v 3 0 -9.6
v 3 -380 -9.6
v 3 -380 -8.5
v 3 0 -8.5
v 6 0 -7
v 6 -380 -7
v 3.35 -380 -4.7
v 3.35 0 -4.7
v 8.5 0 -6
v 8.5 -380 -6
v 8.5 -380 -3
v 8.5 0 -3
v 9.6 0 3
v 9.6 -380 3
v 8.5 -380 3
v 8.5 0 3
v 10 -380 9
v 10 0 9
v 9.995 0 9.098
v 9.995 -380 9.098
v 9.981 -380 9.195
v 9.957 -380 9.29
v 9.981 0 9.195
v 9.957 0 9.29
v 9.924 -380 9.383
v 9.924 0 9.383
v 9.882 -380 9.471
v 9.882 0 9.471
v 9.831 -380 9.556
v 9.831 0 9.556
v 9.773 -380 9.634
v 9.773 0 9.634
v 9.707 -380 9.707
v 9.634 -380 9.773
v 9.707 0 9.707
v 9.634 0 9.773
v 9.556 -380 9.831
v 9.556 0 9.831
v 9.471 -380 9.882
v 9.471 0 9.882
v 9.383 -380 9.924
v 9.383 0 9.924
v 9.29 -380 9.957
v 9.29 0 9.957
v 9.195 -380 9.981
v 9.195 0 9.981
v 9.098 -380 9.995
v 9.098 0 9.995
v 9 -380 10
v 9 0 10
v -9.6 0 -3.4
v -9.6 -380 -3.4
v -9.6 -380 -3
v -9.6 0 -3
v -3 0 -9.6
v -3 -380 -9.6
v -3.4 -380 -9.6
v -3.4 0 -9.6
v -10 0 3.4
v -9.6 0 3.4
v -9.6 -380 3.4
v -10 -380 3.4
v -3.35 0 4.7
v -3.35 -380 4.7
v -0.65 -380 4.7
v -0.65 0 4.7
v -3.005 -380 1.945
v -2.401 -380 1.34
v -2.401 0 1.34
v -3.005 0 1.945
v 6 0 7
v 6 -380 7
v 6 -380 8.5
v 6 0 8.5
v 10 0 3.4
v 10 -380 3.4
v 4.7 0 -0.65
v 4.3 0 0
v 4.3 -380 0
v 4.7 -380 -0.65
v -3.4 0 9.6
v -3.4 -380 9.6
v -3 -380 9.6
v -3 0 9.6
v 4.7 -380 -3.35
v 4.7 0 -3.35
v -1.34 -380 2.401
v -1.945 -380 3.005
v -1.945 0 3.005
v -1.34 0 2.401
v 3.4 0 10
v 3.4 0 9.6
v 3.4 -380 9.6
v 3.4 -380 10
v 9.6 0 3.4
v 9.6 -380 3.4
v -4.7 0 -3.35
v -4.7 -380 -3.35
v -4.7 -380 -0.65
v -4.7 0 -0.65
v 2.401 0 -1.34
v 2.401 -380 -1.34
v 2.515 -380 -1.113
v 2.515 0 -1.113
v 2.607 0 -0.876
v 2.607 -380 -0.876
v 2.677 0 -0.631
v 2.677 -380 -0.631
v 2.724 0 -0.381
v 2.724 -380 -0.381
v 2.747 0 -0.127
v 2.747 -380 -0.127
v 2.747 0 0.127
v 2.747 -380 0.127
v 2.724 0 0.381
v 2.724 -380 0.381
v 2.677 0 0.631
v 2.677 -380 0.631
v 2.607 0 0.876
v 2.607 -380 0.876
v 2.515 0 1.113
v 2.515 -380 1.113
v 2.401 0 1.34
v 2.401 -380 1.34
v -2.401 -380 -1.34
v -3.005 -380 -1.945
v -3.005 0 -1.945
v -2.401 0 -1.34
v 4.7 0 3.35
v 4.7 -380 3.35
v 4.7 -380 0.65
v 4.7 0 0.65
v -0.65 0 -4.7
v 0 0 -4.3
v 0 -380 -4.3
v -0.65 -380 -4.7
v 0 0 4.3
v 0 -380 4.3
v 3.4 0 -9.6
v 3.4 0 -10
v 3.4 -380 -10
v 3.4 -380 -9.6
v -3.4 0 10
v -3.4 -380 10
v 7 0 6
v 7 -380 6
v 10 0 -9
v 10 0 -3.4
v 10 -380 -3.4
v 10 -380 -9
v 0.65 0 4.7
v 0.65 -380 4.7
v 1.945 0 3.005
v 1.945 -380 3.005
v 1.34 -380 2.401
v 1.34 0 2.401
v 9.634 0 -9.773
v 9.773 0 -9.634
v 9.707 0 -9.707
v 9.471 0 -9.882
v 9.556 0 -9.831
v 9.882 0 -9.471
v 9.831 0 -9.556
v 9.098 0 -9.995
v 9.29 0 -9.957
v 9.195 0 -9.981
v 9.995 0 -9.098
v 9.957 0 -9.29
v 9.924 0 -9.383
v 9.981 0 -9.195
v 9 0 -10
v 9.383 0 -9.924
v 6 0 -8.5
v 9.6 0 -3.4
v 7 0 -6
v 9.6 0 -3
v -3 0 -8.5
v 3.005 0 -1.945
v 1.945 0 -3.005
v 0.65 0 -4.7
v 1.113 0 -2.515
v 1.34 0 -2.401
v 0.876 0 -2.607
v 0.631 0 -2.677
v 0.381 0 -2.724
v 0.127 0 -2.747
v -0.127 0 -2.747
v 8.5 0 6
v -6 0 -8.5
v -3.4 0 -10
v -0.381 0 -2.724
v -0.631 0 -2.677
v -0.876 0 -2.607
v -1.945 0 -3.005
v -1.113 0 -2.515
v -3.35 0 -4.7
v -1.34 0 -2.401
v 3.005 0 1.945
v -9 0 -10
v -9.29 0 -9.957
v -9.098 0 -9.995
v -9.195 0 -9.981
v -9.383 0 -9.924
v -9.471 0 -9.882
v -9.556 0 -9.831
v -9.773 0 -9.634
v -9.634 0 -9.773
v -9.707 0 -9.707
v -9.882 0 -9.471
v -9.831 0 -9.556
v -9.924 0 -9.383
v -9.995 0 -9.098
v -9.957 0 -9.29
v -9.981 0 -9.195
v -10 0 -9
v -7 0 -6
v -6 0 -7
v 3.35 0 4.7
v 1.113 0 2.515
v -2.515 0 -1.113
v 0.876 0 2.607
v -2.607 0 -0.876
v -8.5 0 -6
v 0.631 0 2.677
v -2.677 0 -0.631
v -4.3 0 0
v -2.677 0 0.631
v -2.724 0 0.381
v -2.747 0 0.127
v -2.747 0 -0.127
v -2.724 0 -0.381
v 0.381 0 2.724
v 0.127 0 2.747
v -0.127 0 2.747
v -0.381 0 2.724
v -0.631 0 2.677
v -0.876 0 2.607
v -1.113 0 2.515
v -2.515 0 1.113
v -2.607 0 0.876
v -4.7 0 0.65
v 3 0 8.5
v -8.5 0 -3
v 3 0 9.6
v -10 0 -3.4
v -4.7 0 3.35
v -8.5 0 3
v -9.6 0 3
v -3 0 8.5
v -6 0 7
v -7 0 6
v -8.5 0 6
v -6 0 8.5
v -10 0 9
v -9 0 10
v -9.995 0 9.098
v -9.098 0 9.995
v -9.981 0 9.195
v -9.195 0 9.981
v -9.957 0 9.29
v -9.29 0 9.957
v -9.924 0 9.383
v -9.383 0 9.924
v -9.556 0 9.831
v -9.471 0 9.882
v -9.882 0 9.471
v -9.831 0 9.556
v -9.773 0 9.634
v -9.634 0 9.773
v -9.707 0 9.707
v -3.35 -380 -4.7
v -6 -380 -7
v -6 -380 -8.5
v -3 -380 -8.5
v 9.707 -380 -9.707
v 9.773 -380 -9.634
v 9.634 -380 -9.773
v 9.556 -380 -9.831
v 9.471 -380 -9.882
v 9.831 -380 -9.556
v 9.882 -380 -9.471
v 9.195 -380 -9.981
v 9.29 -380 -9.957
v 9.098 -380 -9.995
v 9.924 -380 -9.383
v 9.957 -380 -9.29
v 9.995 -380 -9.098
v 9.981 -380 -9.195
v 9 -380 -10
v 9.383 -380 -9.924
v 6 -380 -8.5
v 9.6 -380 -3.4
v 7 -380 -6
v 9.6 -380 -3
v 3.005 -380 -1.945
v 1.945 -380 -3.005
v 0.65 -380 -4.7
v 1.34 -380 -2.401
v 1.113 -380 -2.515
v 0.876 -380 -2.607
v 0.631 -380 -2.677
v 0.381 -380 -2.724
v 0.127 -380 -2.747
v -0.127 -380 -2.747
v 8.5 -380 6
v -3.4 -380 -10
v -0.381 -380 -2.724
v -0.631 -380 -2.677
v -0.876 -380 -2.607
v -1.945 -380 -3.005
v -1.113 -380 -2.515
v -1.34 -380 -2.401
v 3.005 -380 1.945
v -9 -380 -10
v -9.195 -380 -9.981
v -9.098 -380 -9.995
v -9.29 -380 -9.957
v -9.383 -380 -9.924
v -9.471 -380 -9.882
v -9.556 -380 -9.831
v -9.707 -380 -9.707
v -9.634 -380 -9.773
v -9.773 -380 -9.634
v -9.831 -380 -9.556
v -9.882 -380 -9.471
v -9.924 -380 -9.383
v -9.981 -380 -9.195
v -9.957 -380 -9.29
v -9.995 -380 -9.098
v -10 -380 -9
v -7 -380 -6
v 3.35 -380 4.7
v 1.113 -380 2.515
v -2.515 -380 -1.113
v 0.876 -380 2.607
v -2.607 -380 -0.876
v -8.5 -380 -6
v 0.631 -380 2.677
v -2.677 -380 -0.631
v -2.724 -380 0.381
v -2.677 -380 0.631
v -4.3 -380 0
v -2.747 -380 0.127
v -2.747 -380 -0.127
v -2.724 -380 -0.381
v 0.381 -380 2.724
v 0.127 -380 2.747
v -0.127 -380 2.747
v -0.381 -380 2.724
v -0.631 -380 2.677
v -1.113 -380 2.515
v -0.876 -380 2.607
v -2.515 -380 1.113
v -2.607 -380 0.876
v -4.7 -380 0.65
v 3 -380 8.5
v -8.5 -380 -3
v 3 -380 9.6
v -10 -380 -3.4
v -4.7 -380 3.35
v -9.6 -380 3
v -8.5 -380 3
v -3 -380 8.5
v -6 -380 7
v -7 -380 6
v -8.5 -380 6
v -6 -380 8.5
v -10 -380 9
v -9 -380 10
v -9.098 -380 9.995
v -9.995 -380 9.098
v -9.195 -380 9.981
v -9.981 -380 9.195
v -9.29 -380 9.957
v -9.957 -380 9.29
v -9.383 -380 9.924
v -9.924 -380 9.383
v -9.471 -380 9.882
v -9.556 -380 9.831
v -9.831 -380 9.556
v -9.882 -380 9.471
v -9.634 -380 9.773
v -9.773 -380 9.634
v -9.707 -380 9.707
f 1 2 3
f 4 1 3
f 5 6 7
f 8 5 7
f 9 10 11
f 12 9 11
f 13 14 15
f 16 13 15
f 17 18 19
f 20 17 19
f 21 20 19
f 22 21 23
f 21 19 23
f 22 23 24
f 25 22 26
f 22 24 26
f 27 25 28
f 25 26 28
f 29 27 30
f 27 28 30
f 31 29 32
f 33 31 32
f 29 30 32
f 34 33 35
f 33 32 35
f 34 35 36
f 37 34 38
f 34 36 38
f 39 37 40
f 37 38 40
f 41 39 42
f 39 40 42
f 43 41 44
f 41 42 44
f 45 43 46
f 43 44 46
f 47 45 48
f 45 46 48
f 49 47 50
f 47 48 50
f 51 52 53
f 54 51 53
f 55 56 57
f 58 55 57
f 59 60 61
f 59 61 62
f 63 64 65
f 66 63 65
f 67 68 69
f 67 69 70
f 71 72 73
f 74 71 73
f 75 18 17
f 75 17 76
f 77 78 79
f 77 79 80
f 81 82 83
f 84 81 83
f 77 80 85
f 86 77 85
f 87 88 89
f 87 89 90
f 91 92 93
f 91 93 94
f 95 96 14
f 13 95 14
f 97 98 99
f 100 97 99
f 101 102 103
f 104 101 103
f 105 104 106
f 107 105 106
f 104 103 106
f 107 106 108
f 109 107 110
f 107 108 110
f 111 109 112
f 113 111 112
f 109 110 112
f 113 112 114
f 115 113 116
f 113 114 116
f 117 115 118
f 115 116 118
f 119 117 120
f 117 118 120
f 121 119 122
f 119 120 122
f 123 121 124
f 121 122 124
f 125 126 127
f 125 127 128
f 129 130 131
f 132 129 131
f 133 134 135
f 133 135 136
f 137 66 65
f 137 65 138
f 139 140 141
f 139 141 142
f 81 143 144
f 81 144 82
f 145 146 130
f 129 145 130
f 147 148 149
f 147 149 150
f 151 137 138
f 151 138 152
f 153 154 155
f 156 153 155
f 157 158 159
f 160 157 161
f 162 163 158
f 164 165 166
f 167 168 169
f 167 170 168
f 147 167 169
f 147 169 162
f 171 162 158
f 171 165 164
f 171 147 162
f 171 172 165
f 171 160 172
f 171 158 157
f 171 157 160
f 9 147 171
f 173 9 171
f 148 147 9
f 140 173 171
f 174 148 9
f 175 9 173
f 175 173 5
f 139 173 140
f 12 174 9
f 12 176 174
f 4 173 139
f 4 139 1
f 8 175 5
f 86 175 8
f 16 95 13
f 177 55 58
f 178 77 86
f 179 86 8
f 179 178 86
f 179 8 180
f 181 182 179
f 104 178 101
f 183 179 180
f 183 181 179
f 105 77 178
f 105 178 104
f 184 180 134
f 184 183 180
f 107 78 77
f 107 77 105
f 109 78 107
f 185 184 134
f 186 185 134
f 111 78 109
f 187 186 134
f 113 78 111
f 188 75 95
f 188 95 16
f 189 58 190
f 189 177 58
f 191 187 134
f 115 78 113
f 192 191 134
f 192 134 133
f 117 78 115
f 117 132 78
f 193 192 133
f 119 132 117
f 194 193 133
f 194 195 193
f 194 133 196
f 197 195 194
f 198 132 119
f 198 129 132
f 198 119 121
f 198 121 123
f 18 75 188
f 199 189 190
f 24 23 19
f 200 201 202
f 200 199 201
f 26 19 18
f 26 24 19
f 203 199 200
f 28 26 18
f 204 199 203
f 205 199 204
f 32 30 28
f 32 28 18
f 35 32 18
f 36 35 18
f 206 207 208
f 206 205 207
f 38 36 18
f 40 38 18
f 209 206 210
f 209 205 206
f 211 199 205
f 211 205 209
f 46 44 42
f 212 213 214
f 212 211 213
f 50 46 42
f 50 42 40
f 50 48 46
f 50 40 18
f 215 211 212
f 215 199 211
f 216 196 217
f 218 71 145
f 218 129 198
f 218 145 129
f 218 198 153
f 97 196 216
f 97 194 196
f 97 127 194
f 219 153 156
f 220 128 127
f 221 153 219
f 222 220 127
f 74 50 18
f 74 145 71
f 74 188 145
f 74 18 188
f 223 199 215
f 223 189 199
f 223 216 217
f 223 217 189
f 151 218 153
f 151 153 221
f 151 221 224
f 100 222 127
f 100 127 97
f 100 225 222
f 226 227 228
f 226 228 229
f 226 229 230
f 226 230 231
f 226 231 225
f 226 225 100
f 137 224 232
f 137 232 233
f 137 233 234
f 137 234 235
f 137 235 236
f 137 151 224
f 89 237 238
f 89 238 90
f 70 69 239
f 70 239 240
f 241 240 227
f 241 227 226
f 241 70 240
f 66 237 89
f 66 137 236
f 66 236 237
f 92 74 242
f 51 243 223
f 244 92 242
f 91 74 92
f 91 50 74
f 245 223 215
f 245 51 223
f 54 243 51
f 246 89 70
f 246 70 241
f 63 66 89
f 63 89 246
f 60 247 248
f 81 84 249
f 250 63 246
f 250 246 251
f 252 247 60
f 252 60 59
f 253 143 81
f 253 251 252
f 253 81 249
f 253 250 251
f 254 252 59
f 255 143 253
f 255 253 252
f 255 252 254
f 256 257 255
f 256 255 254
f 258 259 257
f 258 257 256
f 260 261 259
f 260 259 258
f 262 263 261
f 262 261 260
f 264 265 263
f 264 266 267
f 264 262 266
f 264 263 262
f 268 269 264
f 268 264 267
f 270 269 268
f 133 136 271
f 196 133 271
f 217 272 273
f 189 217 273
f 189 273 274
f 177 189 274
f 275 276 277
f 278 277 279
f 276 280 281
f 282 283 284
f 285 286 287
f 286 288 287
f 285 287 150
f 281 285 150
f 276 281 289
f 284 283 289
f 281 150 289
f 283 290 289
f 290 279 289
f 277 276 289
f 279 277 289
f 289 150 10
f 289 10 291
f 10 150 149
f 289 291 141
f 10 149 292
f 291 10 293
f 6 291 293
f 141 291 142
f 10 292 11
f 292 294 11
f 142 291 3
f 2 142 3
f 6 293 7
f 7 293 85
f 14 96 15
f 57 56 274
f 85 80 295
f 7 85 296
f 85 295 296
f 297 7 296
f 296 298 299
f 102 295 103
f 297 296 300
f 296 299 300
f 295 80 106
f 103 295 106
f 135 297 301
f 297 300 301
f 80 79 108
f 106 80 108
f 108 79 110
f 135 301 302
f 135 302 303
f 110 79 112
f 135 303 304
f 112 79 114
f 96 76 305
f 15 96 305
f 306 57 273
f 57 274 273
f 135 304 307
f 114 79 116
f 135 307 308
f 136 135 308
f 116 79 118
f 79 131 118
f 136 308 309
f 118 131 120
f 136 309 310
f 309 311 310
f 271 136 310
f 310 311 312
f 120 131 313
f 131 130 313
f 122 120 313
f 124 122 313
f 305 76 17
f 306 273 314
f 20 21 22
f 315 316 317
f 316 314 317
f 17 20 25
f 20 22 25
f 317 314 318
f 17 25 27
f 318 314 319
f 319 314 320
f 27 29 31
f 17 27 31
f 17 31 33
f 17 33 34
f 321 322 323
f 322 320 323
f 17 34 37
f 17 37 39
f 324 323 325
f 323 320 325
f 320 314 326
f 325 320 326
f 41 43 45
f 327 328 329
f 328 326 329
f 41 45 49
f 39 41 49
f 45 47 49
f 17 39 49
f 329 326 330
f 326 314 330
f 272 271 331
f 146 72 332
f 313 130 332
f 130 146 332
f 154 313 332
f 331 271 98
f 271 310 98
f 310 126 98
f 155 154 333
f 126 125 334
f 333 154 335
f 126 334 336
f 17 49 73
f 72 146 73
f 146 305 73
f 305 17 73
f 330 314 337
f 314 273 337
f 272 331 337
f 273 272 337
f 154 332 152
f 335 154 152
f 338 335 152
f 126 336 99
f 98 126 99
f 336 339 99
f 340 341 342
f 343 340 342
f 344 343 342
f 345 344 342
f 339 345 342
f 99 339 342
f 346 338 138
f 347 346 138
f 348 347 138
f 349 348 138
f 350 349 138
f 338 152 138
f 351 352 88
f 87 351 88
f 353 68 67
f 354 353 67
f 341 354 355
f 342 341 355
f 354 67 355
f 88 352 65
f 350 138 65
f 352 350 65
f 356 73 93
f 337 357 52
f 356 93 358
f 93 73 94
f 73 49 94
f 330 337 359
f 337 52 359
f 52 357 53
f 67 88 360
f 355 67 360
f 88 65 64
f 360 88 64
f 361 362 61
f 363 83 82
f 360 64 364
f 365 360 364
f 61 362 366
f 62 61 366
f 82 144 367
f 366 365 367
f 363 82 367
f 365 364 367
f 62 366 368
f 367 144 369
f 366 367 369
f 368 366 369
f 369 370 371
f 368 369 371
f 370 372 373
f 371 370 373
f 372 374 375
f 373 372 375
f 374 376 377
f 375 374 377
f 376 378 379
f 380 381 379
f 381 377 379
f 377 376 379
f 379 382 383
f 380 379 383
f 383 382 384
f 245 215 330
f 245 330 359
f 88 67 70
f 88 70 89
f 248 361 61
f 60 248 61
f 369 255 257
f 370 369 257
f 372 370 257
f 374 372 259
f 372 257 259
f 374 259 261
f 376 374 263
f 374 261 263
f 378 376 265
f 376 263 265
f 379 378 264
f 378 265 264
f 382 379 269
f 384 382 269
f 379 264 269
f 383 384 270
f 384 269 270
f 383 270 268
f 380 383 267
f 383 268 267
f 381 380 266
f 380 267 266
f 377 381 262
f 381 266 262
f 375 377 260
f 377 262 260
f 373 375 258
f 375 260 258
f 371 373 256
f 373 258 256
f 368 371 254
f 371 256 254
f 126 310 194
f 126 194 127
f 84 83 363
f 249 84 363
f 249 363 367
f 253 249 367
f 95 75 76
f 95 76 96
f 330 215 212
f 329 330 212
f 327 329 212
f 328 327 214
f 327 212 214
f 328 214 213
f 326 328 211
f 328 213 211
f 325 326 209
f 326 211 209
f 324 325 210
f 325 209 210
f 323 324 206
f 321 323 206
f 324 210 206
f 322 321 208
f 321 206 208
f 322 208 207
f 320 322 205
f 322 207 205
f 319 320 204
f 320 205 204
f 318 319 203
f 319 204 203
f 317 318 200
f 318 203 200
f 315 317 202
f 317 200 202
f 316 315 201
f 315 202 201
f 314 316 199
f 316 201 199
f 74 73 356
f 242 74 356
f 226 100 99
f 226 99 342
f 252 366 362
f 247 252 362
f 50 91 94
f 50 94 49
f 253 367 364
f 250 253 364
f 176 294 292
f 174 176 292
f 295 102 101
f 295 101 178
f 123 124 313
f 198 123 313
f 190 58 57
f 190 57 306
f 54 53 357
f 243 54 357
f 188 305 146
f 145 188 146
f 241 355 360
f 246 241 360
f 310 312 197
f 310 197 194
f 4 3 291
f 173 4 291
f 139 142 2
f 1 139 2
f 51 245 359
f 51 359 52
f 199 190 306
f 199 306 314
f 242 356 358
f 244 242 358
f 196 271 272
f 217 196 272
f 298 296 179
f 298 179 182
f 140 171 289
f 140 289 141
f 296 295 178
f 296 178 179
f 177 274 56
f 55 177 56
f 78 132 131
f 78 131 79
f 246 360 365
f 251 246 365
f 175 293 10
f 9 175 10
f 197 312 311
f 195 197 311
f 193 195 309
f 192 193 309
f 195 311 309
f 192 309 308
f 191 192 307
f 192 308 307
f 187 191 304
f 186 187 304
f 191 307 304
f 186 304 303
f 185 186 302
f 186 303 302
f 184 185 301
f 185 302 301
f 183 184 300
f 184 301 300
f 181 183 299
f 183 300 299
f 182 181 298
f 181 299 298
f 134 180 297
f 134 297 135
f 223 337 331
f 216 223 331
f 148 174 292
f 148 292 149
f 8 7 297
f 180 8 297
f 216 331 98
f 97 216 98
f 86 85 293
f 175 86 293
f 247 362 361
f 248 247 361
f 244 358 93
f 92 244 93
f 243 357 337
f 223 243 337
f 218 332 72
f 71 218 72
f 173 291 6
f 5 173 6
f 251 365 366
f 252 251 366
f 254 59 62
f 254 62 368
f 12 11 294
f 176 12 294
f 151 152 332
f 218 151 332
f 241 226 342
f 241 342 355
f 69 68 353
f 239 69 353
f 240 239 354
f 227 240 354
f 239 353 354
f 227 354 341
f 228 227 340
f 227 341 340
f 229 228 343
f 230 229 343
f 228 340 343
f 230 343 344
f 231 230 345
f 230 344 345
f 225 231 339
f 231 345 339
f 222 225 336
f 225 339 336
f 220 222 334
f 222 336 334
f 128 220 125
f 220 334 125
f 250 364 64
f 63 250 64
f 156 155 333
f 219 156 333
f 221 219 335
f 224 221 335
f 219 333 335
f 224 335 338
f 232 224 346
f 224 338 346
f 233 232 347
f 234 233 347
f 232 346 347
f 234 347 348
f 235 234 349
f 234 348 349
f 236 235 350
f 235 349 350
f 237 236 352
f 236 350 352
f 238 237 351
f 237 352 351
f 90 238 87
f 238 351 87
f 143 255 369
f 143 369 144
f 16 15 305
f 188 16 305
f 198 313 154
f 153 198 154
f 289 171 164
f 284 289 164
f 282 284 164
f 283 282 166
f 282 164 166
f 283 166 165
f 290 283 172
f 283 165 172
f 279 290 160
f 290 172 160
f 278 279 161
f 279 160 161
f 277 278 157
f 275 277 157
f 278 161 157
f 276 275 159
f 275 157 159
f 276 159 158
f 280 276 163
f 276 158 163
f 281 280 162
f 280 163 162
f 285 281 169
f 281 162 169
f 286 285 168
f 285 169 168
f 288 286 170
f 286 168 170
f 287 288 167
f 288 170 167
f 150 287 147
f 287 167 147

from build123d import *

# Parameters (mm, degrees)
PAD_DEPTH          = 380
POCKET_DEPTH       = 380
POLARPATTERN_COUNT = 4
POCKET001_DEPTH    = 380


with BuildPart() as part:
    # Sketch → Pad (new body)
    with BuildSketch(Plane.XZ):
        with BuildLine():
            Line((-9, 10), (9, 10))
            ThreePointArc((10, 9), (9.707107, 9.707107), (9, 10))
            Line((10, 9), (10, -9))
            ThreePointArc((9, -10), (9.707107, -9.707107), (10, -9))
            Line((9, -10), (-9, -10))
            ThreePointArc((-10, -9), (-9.707107, -9.707107), (-9, -10))
            Line((-10, -9), (-10, 9))
            ThreePointArc((-9, 10), (-9.707107, 9.707107), (-10, 9))
        make_face()
    extrude(amount=PAD_DEPTH)

    # Sketch001 → Pocket (cut)
    with BuildSketch(Plane.XZ.offset(380)):
        Polygon((-3.4, 10), (-3.4, 9.6), (-3, 9.6), (-3, 8.5), (-6, 8.5), (-6, 7), (-3.35, 4.7), (-0.65, 4.7), (0, 4.3), (0.65, 4.7), (3.35, 4.7), (6, 7), (6, 8.5), (3, 8.5), (3, 9.6), (3.4, 9.6), (3.4, 10), align=None)
    pocket = extrude(amount=-POCKET_DEPTH, mode=Mode.SUBTRACT)

    # PolarPattern: Pocket ×4 about axis
    polarpattern_axis = Axis((0, -380, 0), (0, -1, 0))
    for i in range(1, POLARPATTERN_COUNT):
        add(pocket.rotate(polarpattern_axis, i * 360 / POLARPATTERN_COUNT), mode=Mode.SUBTRACT)

    # Sketch002 → Pocket001 (cut)
    with BuildSketch(Plane.XZ.offset(380)):
        with BuildLine():
            ThreePointArc((1.340499, 2.401159), (0, 2.75), (-1.340499, 2.401159))
            Line((-1.944544, 3.005204), (-1.340499, 2.401159))
            Line((-3.005204, 1.944544), (-1.944544, 3.005204))
            Line((-2.401159, 1.340499), (-3.005204, 1.944544))
            ThreePointArc((-2.401159, 1.340499), (-2.75, 0), (-2.401159, -1.340499))
            Line((-3.005204, -1.944544), (-2.401159, -1.340499))
            Line((-1.944544, -3.005204), (-3.005204, -1.944544))
            Line((-1.340499, -2.401159), (-1.944544, -3.005204))
            ThreePointArc((-1.340499, -2.401159), (0, -2.75), (1.340499, -2.401159))
            Line((1.944544, -3.005204), (1.340499, -2.401159))
            Line((3.005204, -1.944544), (1.944544, -3.005204))
            Line((2.401159, -1.340499), (3.005204, -1.944544))
            ThreePointArc((2.401159, -1.340499), (2.75, 0), (2.401159, 1.340499))
            Line((2.401159, 1.340499), (3.005204, 1.944544))
            Line((3.005204, 1.944544), (1.944544, 3.005204))
            Line((1.944544, 3.005204), (1.340499, 2.401159))
        make_face()
    extrude(amount=-POCKET001_DEPTH, mode=Mode.SUBTRACT)


solid = part.part
